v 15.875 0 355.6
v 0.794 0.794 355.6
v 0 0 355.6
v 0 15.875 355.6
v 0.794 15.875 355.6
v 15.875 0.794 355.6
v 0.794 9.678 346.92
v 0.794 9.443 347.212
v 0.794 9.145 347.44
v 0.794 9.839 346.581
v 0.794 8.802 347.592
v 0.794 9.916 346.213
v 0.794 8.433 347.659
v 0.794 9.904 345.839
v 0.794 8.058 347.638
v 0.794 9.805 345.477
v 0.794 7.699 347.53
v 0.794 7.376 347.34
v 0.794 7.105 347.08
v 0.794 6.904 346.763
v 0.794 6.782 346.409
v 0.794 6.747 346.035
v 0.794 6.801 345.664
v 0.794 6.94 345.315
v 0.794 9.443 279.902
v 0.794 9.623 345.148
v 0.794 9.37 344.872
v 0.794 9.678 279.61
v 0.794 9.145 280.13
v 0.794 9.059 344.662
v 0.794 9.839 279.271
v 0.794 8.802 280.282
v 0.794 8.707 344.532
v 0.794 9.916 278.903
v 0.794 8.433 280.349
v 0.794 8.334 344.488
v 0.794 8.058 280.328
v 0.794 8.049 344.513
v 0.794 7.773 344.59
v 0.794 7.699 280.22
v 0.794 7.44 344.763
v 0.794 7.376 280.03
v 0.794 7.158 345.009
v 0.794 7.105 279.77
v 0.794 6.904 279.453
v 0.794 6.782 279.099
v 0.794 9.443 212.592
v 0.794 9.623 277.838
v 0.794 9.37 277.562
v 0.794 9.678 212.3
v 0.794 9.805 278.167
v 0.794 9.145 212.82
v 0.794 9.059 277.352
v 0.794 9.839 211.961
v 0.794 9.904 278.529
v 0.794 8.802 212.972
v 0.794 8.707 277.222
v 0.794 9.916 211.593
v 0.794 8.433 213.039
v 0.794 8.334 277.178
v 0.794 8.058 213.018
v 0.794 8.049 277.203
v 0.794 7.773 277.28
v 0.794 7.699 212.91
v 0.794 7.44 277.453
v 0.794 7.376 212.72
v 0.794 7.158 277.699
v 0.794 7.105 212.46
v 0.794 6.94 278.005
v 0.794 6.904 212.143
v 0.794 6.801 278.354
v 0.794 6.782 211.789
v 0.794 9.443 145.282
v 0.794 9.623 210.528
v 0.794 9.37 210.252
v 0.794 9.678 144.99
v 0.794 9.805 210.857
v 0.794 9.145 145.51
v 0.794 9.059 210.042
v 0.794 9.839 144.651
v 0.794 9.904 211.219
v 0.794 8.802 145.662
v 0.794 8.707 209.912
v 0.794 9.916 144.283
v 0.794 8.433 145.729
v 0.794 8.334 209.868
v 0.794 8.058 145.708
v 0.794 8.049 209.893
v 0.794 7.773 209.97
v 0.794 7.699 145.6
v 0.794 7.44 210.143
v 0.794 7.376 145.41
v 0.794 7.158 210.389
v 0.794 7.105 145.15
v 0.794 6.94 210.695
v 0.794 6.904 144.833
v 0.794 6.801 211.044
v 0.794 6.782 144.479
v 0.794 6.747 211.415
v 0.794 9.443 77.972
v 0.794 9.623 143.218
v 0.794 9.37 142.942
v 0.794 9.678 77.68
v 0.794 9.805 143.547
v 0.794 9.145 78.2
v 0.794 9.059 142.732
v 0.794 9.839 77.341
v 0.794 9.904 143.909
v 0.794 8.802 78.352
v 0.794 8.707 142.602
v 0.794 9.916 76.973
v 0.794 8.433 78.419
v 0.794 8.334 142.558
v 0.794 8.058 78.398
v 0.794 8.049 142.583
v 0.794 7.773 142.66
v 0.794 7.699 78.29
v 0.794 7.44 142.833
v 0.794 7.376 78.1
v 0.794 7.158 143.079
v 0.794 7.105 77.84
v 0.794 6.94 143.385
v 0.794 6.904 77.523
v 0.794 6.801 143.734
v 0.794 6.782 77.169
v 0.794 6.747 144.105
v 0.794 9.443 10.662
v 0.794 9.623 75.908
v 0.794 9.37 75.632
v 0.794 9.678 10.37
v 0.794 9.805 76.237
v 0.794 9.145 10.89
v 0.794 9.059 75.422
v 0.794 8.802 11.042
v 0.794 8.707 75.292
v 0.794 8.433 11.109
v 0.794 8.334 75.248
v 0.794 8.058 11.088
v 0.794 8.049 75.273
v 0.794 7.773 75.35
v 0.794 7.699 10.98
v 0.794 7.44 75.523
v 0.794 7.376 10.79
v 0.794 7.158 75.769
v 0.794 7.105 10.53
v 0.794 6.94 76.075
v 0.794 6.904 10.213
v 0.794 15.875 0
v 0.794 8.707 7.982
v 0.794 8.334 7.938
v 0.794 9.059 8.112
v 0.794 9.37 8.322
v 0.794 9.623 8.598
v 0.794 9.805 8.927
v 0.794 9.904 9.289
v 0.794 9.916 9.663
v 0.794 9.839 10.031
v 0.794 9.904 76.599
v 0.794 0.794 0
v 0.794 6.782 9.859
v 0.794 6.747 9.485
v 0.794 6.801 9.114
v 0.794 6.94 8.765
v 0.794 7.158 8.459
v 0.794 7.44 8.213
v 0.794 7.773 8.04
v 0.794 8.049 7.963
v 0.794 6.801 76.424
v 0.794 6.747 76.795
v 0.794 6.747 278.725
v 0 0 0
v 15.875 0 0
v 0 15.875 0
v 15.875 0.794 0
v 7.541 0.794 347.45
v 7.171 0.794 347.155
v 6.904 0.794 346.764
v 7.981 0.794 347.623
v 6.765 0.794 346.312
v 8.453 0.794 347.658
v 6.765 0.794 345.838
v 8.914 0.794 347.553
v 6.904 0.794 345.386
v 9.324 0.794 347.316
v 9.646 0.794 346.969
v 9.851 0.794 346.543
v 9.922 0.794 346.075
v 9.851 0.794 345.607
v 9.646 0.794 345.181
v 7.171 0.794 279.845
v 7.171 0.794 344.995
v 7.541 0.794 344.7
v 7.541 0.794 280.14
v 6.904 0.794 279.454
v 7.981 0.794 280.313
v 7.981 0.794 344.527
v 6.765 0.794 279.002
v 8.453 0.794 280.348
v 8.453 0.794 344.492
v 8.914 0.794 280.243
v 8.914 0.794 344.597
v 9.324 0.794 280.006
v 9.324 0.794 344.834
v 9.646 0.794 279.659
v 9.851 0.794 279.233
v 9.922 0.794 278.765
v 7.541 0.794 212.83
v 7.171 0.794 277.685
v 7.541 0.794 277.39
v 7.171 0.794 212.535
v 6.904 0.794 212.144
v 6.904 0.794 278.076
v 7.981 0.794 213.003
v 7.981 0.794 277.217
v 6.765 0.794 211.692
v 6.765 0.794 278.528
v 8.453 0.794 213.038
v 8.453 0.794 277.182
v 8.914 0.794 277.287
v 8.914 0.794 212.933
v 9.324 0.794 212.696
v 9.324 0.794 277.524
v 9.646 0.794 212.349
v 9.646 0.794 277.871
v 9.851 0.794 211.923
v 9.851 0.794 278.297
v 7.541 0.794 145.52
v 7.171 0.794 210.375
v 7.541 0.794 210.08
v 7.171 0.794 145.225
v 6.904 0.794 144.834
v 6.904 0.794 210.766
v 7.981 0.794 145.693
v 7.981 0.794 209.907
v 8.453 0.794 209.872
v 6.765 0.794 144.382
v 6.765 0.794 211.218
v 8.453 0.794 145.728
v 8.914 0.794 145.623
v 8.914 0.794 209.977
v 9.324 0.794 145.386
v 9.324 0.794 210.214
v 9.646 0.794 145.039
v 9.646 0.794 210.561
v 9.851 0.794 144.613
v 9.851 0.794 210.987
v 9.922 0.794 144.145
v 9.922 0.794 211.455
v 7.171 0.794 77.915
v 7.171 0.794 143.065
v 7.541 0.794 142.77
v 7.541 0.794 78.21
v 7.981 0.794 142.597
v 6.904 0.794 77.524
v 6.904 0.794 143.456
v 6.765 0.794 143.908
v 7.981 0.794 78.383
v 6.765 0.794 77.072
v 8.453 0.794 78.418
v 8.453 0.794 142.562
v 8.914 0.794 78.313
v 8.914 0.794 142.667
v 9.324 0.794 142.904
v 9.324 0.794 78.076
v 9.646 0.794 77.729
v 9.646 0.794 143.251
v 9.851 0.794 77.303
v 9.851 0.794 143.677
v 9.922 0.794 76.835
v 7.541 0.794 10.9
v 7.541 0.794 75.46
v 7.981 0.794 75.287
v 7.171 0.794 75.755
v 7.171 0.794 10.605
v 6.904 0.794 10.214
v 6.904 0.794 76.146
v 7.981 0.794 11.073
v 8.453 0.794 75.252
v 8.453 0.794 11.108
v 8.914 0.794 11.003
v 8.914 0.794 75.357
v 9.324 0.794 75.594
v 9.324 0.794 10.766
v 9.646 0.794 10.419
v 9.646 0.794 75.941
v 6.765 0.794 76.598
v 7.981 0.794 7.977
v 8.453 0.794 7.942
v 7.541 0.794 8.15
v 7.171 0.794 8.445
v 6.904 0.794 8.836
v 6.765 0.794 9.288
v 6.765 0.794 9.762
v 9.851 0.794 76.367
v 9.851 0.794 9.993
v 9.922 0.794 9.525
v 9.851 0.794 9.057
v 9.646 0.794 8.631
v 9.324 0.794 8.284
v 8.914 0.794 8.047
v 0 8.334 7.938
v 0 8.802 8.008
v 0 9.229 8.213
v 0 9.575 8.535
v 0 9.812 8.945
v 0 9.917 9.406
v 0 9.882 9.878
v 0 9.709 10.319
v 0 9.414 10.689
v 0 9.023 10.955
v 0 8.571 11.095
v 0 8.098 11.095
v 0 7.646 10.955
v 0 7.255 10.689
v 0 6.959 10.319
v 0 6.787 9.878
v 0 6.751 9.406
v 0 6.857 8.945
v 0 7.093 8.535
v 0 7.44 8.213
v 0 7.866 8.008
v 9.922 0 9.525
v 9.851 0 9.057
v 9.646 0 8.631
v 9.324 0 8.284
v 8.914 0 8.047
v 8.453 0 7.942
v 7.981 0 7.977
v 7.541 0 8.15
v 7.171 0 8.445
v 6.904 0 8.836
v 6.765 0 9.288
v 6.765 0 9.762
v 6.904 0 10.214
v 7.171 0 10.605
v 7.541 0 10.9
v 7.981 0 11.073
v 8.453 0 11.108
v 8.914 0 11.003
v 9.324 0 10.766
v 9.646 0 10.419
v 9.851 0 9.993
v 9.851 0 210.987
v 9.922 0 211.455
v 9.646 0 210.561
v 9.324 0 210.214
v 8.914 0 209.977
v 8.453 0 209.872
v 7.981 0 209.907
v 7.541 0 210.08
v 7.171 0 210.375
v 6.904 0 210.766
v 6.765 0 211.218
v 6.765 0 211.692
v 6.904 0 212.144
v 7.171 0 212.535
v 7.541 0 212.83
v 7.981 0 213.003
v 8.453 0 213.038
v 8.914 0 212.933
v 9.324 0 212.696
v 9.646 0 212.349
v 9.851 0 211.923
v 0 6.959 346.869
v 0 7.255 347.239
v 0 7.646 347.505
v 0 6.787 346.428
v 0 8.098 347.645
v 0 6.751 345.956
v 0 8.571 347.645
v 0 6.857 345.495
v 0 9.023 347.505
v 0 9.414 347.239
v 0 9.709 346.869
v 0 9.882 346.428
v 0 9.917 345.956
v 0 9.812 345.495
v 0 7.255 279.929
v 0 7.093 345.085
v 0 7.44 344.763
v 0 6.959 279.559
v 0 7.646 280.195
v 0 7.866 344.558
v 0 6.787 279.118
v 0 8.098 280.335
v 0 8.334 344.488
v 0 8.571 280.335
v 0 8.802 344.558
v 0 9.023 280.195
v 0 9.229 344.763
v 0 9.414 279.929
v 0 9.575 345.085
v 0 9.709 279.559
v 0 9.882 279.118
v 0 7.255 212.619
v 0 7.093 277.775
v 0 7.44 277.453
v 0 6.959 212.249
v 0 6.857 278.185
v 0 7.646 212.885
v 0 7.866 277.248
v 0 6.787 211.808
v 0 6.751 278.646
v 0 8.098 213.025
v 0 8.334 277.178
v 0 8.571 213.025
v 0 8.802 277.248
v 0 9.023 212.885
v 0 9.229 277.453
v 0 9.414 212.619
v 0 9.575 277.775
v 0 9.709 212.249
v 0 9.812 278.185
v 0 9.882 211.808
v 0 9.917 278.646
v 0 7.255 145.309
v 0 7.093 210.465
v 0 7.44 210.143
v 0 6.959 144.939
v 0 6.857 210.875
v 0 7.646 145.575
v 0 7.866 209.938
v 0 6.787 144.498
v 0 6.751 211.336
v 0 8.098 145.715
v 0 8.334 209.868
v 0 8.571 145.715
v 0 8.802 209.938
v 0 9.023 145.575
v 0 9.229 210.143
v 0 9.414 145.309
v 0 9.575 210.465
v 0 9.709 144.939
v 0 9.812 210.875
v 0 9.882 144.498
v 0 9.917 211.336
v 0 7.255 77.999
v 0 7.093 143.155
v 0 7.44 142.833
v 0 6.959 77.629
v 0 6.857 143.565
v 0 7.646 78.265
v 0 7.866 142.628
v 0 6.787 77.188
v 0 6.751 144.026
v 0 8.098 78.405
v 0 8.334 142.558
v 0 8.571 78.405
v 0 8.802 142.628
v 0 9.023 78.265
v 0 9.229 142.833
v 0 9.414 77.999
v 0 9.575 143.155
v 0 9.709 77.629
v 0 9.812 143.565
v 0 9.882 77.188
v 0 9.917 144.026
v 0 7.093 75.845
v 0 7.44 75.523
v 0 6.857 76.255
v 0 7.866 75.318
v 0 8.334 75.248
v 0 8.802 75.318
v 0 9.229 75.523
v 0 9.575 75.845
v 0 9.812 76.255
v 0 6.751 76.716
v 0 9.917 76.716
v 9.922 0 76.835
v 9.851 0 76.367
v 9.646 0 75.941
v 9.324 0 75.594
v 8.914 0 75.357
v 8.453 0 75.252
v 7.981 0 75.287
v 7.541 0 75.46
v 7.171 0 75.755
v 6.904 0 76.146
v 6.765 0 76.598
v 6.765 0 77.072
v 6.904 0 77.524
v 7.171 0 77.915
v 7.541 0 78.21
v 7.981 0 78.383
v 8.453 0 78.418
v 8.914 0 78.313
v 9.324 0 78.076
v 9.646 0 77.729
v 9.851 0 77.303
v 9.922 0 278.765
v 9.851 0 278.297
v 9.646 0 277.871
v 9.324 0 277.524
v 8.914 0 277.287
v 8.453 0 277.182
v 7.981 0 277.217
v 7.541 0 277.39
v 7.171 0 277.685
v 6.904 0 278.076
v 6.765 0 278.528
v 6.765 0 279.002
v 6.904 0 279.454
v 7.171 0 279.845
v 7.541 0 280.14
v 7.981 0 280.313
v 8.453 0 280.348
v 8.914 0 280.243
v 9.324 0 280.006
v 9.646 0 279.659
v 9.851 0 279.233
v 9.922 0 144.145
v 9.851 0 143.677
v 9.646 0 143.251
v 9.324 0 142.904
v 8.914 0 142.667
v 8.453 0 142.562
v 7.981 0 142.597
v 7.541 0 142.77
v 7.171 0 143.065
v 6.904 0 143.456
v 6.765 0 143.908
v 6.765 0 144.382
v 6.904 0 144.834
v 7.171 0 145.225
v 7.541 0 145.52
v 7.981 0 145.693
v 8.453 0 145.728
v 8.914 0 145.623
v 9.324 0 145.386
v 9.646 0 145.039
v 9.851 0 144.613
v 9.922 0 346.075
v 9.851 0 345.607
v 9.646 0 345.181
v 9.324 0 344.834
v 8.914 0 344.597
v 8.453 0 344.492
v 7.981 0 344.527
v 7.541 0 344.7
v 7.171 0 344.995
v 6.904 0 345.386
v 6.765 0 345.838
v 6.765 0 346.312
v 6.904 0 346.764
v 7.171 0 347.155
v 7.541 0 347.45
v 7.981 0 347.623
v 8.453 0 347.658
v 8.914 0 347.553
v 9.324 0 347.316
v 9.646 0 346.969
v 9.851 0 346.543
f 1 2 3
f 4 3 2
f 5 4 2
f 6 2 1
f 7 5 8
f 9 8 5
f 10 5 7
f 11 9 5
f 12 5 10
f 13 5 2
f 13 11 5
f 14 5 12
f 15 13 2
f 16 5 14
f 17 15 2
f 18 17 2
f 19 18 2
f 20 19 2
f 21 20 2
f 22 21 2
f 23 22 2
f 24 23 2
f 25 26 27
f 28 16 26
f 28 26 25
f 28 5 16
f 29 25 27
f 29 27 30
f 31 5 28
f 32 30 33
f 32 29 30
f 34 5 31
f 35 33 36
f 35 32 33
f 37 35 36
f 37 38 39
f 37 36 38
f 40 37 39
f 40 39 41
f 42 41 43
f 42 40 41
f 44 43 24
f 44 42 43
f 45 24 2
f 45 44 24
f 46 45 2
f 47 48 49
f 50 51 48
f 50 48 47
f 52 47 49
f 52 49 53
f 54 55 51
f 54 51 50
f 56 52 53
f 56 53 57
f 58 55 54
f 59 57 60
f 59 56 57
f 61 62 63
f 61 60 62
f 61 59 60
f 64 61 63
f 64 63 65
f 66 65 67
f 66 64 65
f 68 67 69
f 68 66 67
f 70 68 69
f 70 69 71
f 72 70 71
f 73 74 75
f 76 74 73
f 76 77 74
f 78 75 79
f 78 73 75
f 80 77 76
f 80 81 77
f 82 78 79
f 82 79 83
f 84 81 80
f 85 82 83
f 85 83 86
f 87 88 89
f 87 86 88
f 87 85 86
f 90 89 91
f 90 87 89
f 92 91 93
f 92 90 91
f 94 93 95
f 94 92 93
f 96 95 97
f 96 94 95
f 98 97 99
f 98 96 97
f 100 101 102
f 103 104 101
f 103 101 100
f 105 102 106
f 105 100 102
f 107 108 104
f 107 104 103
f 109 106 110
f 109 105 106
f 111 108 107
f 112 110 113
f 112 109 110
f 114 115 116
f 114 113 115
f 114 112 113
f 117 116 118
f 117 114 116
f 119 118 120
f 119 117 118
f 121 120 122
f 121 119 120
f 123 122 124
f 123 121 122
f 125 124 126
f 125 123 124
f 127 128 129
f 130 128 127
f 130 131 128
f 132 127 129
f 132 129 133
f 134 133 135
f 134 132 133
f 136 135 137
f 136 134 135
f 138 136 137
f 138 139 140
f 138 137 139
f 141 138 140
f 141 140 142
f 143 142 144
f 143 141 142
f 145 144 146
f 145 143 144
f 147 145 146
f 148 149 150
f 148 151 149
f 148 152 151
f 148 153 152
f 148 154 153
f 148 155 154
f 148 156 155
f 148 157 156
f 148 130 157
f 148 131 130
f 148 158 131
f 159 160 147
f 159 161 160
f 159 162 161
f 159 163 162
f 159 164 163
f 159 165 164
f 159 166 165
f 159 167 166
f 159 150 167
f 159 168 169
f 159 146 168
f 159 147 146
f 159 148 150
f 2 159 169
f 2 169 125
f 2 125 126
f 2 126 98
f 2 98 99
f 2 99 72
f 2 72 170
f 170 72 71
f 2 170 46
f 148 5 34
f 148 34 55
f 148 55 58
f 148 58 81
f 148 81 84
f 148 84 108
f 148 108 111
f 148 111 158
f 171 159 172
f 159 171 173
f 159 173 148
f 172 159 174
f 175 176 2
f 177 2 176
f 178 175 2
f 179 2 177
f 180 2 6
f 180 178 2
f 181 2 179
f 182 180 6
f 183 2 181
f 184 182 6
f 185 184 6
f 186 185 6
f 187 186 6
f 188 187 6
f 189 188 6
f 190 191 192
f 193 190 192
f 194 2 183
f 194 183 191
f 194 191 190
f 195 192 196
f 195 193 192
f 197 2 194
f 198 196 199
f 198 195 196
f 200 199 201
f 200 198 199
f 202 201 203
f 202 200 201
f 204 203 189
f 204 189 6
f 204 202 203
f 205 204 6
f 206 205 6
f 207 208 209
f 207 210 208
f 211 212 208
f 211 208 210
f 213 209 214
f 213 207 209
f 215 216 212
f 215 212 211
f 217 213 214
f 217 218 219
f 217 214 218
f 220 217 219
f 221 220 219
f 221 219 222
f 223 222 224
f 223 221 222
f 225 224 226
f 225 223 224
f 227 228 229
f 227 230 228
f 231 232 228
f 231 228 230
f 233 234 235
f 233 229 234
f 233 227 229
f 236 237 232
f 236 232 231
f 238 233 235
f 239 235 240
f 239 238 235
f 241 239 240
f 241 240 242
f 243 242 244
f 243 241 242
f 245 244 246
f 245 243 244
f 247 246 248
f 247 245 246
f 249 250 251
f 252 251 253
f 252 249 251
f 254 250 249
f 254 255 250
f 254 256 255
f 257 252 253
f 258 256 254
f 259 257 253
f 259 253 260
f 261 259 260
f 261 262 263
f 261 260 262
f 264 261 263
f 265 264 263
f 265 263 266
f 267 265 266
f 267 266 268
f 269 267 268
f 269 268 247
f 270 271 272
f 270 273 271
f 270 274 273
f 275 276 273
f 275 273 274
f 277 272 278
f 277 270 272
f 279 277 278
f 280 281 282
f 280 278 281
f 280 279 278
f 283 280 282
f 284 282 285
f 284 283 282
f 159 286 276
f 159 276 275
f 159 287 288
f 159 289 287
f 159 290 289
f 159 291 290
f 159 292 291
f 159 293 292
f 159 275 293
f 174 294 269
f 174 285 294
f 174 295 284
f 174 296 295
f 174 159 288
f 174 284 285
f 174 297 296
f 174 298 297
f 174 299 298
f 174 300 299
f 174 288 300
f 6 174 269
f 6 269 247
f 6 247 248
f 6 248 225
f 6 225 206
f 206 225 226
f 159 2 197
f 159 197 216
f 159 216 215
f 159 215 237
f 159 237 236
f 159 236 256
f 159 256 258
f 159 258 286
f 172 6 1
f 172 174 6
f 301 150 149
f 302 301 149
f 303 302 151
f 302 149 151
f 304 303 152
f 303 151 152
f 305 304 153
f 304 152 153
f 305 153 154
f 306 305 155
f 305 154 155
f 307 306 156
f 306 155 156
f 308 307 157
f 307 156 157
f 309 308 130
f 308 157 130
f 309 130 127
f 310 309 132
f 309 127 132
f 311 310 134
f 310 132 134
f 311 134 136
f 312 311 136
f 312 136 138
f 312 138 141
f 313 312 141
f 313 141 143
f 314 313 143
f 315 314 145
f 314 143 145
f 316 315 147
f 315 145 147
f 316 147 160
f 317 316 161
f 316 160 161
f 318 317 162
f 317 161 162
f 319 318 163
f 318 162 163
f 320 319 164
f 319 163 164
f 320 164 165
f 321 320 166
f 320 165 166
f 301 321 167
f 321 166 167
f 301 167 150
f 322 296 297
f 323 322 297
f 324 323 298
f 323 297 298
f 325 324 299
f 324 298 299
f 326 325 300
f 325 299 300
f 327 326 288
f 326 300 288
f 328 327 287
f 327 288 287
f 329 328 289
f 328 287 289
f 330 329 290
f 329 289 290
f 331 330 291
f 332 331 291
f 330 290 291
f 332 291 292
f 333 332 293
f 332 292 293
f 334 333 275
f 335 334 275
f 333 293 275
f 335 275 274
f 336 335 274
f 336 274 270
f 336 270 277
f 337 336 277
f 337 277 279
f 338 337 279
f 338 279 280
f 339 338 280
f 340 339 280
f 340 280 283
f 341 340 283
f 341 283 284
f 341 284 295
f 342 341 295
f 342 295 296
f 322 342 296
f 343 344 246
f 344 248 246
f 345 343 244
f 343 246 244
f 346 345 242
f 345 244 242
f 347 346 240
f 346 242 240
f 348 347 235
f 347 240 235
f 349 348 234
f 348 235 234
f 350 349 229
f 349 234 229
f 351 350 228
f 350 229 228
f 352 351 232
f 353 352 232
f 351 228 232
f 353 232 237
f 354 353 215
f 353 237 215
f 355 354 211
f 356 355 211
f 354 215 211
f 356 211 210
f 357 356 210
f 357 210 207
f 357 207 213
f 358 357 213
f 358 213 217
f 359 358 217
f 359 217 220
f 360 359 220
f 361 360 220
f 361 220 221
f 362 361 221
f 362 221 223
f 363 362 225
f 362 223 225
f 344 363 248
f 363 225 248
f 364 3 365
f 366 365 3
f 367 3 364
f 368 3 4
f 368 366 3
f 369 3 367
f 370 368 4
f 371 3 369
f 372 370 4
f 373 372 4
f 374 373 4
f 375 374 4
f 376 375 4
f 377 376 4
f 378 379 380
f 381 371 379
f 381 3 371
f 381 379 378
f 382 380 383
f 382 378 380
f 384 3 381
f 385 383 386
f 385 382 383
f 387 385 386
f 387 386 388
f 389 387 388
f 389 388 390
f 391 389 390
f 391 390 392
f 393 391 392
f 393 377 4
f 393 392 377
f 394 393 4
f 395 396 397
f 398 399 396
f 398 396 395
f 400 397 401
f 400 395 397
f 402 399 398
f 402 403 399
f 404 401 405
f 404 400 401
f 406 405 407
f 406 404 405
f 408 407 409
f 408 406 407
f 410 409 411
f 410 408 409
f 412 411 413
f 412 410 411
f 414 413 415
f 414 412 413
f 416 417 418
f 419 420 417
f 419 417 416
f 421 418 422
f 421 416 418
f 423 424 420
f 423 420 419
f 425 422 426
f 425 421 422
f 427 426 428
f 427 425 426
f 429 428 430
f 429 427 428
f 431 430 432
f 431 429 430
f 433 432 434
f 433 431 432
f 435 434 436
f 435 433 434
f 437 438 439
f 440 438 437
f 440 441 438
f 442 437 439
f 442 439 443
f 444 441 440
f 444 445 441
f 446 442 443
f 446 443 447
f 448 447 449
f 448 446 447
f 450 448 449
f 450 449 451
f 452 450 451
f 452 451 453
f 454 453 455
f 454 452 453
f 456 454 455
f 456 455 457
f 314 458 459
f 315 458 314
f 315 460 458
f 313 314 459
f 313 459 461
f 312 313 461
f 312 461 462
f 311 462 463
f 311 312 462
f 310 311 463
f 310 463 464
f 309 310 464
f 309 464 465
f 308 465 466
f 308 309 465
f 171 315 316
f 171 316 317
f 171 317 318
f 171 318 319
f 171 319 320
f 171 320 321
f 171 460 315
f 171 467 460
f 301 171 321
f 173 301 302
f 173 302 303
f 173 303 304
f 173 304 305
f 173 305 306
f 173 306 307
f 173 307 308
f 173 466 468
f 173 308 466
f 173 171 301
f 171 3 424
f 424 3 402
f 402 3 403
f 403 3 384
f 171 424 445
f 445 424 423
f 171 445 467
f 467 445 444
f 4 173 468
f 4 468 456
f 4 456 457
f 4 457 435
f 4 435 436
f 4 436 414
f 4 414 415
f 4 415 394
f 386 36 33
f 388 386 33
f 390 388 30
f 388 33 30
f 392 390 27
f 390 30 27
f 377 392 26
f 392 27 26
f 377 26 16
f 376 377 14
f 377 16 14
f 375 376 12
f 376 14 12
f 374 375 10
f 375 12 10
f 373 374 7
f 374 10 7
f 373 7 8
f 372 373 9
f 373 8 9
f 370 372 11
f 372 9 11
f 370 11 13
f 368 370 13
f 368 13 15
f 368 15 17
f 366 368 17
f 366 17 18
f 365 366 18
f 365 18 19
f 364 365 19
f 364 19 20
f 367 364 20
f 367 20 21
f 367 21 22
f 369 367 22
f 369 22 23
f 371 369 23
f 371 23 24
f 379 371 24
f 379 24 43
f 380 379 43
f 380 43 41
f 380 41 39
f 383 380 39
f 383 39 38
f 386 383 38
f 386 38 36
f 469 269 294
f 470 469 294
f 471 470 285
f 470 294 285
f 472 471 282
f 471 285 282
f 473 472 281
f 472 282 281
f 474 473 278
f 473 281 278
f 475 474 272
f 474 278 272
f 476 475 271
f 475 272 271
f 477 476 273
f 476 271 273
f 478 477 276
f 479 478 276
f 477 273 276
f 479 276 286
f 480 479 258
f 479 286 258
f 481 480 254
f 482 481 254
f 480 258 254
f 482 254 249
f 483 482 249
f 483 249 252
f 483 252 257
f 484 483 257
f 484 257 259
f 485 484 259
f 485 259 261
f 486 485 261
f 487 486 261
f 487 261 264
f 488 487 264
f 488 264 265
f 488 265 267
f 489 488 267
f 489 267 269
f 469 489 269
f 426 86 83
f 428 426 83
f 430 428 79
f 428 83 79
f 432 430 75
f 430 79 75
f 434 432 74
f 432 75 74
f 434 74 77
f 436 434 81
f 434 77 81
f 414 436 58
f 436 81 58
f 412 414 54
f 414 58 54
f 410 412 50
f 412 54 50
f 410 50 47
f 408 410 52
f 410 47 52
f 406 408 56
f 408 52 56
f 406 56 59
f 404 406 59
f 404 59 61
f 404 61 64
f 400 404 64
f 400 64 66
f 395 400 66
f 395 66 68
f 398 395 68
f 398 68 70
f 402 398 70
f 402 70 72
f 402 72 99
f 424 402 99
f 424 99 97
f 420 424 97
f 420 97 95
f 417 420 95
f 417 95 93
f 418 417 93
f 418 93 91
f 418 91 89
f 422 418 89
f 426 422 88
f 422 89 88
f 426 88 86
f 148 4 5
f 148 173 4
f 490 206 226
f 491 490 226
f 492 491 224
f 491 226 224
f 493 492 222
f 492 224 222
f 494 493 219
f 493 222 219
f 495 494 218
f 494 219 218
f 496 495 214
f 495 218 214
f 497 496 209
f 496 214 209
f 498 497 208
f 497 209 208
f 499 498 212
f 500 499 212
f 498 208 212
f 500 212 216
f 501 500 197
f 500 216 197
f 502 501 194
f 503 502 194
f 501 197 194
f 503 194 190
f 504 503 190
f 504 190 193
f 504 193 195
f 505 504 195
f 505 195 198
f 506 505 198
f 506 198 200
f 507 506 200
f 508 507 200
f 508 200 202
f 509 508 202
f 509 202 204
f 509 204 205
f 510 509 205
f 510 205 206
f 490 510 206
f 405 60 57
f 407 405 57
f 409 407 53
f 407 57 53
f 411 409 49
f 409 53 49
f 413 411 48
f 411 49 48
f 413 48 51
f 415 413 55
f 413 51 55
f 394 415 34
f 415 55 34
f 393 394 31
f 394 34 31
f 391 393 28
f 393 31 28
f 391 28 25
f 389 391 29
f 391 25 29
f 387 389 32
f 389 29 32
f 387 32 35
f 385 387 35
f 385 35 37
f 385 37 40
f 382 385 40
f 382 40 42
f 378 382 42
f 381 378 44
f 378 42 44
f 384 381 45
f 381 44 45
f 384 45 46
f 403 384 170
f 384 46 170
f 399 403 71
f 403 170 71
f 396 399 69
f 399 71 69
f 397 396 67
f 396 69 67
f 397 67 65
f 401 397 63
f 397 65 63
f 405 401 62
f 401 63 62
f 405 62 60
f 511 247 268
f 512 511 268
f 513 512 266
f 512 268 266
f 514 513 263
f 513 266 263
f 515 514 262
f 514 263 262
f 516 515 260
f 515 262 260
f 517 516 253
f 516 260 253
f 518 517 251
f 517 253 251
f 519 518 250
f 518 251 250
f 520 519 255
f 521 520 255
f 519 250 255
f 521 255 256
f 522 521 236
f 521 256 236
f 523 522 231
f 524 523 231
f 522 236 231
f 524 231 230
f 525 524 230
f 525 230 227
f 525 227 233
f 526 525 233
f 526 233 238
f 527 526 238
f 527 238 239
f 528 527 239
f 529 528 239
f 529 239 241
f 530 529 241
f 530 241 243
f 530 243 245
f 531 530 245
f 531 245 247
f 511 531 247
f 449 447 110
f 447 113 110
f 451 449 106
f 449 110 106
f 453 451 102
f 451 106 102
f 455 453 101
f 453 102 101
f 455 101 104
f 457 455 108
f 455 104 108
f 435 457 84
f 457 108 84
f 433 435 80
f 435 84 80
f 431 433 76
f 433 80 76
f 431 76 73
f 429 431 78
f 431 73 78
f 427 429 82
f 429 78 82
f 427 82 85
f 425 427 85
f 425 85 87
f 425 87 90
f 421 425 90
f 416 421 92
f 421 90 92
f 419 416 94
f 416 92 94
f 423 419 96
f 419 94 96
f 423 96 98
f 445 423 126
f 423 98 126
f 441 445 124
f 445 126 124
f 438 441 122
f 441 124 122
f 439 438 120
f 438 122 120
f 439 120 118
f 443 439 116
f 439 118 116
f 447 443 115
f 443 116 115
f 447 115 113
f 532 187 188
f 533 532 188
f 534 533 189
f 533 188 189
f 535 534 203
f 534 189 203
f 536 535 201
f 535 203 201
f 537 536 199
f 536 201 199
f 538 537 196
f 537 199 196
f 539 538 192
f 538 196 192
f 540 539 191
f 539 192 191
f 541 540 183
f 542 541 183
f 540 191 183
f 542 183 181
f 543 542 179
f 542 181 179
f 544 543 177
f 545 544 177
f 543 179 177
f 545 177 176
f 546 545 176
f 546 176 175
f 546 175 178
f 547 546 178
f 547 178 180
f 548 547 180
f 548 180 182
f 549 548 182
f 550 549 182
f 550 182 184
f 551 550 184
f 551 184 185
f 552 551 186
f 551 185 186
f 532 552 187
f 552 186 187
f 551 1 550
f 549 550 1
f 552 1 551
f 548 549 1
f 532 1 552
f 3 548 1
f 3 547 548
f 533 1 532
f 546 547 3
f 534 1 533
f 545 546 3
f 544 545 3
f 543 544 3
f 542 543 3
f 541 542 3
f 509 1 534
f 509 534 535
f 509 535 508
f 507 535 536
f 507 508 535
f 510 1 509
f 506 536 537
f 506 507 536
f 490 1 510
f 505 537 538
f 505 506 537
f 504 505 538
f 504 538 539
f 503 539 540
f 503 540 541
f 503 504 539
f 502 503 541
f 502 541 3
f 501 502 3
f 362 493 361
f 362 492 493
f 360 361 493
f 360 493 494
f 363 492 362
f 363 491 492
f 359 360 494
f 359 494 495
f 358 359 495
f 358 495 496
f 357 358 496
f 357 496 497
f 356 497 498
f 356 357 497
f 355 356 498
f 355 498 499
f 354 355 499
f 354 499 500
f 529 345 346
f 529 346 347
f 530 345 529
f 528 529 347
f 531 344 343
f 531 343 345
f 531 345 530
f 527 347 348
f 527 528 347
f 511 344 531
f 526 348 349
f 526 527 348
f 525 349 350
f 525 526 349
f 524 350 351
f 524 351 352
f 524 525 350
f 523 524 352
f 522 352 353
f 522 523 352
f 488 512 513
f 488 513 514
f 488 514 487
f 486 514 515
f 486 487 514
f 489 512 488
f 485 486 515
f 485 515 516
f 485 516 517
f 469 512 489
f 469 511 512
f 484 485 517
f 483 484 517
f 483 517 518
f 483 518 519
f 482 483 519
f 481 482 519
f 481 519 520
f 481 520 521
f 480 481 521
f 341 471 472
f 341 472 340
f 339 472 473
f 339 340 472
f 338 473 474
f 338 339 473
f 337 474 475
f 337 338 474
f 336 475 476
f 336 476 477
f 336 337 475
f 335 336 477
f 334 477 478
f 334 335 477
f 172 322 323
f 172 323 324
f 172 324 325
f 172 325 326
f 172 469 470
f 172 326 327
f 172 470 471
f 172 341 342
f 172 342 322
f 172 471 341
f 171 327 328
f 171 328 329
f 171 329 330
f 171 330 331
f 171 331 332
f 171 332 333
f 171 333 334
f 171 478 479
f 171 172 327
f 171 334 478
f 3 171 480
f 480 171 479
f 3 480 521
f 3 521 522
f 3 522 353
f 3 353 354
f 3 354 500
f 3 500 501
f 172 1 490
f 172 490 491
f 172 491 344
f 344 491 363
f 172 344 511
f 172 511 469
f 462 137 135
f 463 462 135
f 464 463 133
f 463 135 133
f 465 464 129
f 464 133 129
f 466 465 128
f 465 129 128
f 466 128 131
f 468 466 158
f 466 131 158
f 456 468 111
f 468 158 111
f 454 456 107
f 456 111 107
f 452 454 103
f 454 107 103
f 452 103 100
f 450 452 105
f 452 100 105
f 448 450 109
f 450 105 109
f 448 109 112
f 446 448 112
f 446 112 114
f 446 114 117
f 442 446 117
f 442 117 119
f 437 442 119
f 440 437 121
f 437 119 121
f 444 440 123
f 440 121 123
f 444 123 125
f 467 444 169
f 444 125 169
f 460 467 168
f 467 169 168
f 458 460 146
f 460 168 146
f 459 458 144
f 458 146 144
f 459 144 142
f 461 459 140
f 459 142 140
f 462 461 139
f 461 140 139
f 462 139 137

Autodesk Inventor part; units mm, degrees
ref_plane "YZ Plane" through (0, 0, 0) normal (1, 0, 0) x (0, 1, 0)
ref_plane "XZ Plane" through (0, 0, 0) normal (0, 1, 0) x (-1, 0, 0)
ref_plane "XY Plane" through (0, 0, 0) normal (0, 0, 1) x (1, 0, 0)
sketch "Sketch1" plane through (0, 0, 0) normal (0, 0, 1) x (1, 0, 0)
  line L0 (0, 0) -> (0, 15.875)
  line L1 (0, 15.875) -> (0.7937, 15.875)
  line L2 (0.7937, 15.875) -> (0.7938, 0.7937)
  line L3 (0.7938, 0.7937) -> (15.875, 0.7937)
  line L4 (15.875, 0.7937) -> (15.875, 0)
  line L5 (15.875, 0) -> (0, 0)
  dimension "d0" = 15.875
  dimension "d1" = 0.7937
extrude "Extrusion1" add sketch "Sketch1" along normal blind 355.6
sketch "Sketch2" plane through (0.7938, 0.7937, 0) normal (0, 1, 0) x (1, 0, 0)
  line L0 (0, 0) -> (15.0812, 0) projected
  line L1 (15.0812, -355.6) -> (0, -355.6) projected
  line L2 (7.5406, 0) -> (7.5406, -355.6) construction
  circle A0 centre (7.5406, -9.525) radius 1.5875
  circle A1 centre (7.5406, -76.835) radius 1.5875
  circle A2 centre (7.5406, -144.145) radius 1.5875
  circle A3 centre (7.5406, -211.455) radius 1.5875
  circle A4 centre (7.5406, -278.765) radius 1.5875
  circle A5 centre (7.5406, -346.075) radius 1.5875
  point P0 (-0.7938, 0)
  dimension "d4" = 9.525
  dimension "d5" = 3.175
  dimension "d6" = 355.6
  dimension "d9" = 67.31
sketch "Sketch3" plane through (0.7938, 0.7937, 0) normal (1, 0, 0) x (0, 0, -1)
  line L0 (0, 15.0812) -> (0, 0) projected
  line L1 (-355.6, 0) -> (-355.6, 15.0812) projected
  line L2 (-355.6, 7.5406) -> (0, 7.5406) construction
  circle A0 centre (-9.525, 7.5406) radius 1.5875
  circle A1 centre (-76.835, 7.5406) radius 1.5875
  circle A2 centre (-144.145, 7.5406) radius 1.5875
  circle A3 centre (-211.455, 7.5406) radius 1.5875
  circle A4 centre (-278.765, 7.5406) radius 1.5875
  circle A5 centre (-346.075, 7.5406) radius 1.5875
  point P0 (0, -0.7937)
  dimension "d14" = 3.175
  dimension "d15" = 9.525
  dimension "d16" = 355.6
  dimension "d19" = 67.31
extrude "Extrusion2" cut sketch "Sketch2" against normal through all
extrude "Extrusion3" cut sketch "Sketch3" against normal through all
properties part number "Hopper Bracing Back Bottom P11" material "Aluminum 6061"
